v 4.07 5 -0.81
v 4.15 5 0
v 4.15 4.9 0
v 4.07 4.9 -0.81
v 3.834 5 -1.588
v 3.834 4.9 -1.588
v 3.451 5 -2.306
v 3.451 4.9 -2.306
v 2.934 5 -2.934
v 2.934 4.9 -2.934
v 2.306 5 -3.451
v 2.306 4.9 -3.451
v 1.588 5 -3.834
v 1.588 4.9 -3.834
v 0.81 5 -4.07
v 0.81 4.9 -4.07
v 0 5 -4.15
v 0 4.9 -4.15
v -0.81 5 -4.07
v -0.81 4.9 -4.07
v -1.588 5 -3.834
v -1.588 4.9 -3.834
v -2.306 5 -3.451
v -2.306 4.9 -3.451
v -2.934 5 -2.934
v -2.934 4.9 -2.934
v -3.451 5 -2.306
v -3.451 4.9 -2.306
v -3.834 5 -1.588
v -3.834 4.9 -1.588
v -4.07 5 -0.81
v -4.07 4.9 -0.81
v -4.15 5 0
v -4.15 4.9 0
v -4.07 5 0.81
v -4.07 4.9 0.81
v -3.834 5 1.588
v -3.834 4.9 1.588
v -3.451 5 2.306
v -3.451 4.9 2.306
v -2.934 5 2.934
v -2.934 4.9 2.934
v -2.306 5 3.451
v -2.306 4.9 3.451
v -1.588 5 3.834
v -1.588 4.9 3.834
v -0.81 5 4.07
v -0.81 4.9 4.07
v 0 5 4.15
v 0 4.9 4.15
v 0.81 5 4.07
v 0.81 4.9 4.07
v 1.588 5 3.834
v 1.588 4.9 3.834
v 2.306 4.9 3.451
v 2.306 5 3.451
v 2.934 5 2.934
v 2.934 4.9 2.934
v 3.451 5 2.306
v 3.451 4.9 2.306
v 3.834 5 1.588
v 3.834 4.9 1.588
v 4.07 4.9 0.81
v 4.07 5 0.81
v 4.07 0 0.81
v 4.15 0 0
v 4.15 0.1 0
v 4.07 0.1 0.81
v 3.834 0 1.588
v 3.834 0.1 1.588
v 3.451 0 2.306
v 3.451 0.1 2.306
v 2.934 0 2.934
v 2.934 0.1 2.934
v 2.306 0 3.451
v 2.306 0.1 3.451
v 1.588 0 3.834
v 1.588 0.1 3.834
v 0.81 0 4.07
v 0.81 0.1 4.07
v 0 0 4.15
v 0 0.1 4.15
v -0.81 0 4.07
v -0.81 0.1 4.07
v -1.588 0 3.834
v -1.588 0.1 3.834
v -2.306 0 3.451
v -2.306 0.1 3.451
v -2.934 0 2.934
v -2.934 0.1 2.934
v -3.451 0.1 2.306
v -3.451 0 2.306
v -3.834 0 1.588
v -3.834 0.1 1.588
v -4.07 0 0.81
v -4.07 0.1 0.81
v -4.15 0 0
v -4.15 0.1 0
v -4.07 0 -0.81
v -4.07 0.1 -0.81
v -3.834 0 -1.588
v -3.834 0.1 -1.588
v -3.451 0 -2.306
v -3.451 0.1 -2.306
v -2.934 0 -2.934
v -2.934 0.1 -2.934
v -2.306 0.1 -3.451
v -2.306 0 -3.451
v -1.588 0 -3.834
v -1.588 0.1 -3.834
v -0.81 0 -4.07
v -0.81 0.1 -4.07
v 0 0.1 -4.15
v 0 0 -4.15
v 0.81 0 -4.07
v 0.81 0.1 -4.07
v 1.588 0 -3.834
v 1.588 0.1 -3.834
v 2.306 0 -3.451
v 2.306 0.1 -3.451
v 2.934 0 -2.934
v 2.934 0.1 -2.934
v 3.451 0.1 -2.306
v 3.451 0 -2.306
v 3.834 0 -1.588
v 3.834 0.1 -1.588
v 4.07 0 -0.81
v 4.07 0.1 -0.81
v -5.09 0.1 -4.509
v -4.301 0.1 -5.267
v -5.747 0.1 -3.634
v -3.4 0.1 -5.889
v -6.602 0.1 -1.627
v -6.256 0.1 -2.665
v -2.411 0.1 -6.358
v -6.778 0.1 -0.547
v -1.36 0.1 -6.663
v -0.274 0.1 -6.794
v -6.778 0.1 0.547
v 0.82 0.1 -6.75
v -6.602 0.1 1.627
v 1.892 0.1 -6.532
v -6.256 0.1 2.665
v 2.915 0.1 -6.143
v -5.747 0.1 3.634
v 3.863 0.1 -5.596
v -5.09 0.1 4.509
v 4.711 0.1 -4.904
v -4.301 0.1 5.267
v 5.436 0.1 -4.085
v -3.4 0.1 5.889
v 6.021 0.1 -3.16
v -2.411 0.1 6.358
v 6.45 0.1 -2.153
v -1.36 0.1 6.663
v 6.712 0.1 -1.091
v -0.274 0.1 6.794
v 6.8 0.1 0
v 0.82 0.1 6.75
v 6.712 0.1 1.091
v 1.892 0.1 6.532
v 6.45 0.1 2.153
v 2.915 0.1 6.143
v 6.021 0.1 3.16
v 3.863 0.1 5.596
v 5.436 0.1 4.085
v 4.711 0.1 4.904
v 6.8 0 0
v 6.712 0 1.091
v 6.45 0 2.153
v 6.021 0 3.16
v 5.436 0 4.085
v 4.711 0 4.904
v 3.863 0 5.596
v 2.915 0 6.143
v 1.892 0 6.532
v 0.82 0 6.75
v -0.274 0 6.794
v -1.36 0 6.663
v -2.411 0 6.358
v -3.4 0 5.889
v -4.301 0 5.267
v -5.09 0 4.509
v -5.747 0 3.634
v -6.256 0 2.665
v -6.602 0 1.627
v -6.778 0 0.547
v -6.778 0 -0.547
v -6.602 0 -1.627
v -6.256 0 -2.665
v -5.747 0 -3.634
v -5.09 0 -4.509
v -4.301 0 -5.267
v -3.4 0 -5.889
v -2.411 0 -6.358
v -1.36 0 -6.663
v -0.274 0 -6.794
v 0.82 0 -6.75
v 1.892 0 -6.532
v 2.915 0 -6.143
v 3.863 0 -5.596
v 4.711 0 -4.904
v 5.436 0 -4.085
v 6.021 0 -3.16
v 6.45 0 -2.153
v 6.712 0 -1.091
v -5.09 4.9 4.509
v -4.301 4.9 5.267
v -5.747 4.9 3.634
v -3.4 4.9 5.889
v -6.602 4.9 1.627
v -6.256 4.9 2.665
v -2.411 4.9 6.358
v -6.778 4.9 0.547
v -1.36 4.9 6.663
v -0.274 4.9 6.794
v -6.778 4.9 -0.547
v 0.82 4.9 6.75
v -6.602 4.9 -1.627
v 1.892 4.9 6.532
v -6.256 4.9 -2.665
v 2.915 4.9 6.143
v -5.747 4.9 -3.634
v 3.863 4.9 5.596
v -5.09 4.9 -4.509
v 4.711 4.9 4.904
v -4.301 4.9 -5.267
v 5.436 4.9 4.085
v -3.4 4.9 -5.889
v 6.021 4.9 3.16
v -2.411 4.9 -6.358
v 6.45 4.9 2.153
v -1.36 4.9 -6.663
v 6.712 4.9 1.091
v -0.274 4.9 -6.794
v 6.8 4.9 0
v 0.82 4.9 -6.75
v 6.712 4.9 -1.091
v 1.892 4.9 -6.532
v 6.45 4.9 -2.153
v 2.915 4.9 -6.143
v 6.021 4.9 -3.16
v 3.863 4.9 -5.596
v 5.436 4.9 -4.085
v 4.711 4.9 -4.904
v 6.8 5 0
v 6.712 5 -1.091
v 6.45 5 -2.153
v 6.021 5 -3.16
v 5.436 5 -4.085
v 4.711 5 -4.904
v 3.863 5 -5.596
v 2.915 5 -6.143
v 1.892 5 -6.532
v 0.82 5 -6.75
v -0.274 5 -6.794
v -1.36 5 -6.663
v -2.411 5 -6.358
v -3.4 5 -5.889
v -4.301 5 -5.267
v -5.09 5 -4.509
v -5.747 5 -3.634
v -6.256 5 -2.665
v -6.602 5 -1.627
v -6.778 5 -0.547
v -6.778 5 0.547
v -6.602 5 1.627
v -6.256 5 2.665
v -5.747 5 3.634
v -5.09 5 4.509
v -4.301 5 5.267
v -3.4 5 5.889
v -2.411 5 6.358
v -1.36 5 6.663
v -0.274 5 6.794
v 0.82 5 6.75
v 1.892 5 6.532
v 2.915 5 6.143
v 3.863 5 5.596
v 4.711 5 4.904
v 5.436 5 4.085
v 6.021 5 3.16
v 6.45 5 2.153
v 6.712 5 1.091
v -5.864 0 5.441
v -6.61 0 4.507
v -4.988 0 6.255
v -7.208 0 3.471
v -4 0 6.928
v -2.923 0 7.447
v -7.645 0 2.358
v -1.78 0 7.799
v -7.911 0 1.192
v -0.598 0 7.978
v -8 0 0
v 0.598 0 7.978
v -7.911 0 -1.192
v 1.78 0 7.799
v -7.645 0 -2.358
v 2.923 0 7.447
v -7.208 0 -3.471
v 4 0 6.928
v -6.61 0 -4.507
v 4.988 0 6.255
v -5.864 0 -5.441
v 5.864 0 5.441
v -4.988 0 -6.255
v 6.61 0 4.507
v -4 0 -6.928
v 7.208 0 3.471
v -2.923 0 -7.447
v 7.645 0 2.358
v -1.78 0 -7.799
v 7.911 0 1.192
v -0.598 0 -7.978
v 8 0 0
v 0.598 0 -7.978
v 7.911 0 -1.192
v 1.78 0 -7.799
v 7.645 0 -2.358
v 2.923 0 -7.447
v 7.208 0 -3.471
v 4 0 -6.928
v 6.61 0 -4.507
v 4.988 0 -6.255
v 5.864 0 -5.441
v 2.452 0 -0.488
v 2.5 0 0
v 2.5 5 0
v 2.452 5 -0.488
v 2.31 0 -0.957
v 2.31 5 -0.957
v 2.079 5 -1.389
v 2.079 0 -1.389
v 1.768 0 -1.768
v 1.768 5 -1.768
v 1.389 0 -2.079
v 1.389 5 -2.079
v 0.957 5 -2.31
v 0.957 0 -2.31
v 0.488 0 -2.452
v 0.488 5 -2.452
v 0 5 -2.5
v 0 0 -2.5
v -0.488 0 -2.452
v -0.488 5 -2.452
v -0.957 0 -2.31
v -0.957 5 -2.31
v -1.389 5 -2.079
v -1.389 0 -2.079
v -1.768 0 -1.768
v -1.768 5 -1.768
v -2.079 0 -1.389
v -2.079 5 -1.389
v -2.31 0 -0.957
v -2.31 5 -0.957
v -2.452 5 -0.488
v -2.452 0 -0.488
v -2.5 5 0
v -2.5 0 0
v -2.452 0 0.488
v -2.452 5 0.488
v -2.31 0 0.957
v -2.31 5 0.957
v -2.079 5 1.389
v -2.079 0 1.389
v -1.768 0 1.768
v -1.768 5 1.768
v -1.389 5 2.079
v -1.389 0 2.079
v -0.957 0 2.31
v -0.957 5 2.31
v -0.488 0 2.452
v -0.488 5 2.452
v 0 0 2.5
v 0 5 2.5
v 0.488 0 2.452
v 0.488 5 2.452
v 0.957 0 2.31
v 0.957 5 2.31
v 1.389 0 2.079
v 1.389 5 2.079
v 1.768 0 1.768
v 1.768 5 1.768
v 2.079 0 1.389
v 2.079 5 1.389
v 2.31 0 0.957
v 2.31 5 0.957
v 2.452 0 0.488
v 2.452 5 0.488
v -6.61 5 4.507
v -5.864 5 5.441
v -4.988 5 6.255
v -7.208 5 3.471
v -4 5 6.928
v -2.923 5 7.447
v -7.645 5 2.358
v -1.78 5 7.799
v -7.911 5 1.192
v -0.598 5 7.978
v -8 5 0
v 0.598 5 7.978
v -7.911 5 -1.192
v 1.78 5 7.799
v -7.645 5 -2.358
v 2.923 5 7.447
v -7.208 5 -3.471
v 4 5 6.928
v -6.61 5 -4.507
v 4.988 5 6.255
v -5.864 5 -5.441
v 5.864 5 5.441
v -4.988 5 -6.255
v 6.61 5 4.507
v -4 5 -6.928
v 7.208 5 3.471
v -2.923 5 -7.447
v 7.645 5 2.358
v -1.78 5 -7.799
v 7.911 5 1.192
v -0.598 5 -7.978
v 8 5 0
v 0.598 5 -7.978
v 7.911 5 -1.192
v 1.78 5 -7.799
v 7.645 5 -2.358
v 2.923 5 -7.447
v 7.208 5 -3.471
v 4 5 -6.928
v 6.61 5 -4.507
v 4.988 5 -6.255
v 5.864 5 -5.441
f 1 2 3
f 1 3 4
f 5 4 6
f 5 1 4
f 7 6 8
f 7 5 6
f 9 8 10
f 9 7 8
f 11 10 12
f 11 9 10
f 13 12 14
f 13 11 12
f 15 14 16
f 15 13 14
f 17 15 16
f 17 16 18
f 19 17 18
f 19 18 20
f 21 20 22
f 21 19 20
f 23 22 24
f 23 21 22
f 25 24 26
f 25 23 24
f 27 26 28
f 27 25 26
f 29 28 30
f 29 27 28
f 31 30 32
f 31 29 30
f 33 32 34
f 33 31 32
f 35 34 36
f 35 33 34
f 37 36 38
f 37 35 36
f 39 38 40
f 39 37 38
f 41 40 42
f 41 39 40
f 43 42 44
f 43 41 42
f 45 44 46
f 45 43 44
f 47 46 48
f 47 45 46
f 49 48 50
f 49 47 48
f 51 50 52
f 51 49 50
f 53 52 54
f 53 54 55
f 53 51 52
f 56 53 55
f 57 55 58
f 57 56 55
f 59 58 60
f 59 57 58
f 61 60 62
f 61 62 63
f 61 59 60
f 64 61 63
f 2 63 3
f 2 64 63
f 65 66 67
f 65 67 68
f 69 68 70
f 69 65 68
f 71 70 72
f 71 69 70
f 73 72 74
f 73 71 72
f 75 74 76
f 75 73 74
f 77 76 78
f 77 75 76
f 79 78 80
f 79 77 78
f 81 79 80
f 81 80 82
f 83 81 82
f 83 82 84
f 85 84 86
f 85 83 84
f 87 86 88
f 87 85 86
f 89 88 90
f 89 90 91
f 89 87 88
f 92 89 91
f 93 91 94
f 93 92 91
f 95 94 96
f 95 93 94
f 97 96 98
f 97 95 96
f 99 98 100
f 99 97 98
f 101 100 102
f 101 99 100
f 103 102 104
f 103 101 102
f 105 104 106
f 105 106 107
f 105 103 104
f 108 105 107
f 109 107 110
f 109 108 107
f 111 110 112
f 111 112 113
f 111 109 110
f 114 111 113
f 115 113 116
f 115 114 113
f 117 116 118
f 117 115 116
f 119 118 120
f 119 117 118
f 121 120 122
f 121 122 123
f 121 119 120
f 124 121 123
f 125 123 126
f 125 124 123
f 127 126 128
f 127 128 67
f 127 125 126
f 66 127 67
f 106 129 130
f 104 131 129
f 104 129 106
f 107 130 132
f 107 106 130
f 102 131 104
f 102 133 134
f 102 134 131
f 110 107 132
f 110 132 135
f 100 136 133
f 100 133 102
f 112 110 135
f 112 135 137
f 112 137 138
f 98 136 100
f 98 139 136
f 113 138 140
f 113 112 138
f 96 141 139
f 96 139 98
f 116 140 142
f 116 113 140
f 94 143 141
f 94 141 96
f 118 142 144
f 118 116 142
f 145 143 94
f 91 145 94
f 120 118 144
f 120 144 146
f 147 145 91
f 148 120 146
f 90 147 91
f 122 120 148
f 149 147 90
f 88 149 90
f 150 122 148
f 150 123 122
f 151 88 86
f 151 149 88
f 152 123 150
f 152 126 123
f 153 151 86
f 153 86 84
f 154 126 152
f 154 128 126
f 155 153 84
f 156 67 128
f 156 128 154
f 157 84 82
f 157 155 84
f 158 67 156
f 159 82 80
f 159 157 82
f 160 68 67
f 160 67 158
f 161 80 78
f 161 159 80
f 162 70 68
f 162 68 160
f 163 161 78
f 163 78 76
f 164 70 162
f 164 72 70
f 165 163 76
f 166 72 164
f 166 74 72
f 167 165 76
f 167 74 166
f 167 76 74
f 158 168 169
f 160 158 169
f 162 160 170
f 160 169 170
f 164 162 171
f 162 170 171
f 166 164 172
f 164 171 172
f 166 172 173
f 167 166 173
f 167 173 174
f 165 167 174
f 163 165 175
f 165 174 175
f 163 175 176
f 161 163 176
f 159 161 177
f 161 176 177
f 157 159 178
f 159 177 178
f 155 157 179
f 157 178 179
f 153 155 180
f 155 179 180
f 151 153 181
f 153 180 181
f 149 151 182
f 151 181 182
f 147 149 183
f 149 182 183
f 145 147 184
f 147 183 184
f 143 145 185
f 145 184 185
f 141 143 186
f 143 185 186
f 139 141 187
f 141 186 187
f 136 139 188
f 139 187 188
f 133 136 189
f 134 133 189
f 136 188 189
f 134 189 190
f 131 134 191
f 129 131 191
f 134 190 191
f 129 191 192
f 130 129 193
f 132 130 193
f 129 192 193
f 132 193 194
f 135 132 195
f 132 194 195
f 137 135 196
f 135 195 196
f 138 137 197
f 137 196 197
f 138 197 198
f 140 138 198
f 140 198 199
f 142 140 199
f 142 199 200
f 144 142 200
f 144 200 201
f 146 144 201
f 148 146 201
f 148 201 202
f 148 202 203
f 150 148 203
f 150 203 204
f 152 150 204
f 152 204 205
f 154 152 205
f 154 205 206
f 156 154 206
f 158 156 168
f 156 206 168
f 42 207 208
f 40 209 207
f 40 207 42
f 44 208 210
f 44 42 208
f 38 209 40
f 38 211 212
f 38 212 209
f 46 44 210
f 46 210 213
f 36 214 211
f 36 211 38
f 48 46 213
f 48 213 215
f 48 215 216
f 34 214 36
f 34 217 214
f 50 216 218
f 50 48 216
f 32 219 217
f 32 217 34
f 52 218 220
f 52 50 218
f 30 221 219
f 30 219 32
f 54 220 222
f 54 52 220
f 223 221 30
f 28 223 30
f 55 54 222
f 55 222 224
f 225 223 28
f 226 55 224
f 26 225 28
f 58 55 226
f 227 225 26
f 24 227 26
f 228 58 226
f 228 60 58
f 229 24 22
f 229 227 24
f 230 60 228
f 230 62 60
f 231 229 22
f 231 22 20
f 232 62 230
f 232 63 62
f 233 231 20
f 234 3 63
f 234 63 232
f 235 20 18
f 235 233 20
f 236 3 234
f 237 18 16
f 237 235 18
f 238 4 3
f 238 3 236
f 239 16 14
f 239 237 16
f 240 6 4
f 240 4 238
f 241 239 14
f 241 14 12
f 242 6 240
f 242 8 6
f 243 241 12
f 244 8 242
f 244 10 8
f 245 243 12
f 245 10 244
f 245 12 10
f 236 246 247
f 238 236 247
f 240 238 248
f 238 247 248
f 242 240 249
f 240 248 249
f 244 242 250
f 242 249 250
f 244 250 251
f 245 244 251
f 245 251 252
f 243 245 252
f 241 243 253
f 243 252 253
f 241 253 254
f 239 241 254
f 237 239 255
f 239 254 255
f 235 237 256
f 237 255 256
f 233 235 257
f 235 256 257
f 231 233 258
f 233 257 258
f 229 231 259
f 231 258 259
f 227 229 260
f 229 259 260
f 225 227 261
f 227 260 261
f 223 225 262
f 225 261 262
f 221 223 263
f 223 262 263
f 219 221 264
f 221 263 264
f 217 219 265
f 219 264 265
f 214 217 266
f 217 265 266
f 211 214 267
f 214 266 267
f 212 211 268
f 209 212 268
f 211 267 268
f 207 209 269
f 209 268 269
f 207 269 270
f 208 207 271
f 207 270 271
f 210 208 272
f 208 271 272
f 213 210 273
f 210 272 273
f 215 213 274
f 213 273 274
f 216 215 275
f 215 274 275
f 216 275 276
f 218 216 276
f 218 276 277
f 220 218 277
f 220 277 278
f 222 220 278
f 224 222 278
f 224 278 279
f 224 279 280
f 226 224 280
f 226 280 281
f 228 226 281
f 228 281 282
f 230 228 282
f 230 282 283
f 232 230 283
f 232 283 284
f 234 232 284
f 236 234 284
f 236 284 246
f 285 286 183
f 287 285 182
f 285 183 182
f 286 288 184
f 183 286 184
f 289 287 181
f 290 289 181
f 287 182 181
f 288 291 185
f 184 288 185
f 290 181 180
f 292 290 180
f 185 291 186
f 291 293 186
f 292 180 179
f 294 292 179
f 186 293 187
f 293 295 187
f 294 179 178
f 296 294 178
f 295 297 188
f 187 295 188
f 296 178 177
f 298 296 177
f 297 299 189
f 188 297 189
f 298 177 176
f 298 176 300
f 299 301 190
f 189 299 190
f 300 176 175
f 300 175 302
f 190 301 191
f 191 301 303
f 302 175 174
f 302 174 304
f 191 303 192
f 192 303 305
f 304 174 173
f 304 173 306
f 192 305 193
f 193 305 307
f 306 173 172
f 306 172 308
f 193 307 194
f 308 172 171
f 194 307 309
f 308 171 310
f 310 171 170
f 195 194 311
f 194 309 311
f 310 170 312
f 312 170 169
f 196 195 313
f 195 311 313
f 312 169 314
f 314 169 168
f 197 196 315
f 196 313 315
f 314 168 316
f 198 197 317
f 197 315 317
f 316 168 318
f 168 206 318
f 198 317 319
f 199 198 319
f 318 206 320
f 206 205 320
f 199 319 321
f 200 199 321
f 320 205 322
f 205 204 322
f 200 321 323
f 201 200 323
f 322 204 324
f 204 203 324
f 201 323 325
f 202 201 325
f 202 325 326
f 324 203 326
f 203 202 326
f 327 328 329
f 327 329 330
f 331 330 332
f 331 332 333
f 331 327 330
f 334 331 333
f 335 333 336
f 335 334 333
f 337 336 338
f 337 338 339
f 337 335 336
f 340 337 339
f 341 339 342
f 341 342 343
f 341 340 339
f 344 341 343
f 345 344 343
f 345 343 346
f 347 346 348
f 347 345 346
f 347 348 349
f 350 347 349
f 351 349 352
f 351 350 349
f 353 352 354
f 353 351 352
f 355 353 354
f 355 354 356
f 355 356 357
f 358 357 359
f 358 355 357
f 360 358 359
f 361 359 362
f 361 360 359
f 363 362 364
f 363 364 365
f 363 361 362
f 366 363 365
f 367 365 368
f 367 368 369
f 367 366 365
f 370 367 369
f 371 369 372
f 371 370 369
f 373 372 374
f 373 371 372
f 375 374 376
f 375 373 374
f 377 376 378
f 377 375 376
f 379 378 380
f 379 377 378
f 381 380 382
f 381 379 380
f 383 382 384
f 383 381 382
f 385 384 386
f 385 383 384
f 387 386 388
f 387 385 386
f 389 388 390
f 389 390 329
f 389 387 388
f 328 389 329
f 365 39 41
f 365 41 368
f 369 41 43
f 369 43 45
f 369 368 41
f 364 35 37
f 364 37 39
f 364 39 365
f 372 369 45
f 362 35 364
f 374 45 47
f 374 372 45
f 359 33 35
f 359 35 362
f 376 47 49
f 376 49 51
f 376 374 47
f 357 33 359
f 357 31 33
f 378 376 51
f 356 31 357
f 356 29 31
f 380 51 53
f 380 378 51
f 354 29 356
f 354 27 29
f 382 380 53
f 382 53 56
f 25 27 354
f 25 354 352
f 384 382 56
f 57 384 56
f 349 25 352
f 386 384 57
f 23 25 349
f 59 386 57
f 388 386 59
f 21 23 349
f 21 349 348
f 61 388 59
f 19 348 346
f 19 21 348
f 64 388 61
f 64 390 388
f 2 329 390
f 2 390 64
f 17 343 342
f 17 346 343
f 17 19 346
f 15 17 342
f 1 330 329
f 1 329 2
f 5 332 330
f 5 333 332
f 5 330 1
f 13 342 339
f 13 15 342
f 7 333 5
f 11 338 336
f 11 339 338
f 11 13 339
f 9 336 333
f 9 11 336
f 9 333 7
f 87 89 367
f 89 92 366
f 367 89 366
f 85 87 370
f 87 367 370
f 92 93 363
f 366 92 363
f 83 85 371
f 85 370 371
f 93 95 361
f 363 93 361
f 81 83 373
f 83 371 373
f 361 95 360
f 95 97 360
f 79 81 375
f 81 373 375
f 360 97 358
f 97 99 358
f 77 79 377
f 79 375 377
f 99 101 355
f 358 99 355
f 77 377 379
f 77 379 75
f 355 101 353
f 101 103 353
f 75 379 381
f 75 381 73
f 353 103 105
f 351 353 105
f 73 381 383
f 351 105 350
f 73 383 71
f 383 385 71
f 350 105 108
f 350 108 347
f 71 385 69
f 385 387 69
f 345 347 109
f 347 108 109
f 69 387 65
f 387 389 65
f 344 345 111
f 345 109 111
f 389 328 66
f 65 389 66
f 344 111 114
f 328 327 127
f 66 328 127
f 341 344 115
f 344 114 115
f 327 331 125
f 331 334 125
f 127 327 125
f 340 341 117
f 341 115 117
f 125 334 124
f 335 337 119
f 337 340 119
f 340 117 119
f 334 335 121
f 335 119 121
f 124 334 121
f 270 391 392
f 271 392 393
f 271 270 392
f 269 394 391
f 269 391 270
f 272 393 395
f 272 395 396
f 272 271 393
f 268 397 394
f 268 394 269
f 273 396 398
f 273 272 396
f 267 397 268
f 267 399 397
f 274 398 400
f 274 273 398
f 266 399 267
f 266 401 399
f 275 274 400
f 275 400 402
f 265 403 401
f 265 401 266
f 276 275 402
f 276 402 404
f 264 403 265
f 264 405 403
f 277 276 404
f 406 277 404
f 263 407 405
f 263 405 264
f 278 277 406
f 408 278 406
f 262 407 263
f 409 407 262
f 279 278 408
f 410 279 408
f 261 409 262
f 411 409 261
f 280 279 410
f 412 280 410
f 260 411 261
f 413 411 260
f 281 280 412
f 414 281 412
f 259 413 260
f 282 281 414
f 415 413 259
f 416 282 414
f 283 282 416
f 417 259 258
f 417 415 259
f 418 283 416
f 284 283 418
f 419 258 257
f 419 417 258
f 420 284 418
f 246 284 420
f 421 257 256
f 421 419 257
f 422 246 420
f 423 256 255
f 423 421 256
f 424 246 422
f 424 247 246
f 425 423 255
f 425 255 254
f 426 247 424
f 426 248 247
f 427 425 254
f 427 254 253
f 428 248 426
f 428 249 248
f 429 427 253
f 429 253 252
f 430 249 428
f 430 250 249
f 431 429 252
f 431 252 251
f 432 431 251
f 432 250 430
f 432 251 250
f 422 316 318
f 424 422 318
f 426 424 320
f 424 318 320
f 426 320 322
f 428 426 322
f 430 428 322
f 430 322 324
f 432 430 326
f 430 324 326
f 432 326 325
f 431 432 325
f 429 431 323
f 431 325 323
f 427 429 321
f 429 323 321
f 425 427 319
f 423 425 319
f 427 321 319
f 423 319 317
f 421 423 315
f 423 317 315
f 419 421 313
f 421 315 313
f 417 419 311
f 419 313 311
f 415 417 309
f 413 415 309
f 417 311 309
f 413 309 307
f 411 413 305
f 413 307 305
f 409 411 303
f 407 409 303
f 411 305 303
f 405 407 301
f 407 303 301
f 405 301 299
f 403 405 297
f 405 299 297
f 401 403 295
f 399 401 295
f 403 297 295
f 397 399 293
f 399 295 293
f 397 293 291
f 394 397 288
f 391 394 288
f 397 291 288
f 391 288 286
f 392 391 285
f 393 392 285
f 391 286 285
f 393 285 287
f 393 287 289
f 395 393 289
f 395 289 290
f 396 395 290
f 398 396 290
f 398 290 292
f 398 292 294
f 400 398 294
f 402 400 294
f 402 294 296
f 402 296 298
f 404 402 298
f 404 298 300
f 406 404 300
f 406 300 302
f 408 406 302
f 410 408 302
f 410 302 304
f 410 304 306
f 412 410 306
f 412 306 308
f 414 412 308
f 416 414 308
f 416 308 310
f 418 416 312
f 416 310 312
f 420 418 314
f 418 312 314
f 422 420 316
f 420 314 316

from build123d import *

# Parameters (mm, degrees)
SKETCH1_R           = 8
SKETCH1_R_2         = 2.5
BOSS_EXTRUDE1_DEPTH = 5
SKETCH2_R           = 6.8
SKETCH2_R_2         = 4.15
CUT_EXTRUDE1_DEPTH  = 0.1
SKETCH3_R           = 6.8
SKETCH3_R_2         = 4.15
CUT_EXTRUDE2_DEPTH  = 0.1


with BuildPart() as part:
    # Sketch1 → Boss-Extrude1 (new body)
    with BuildSketch(Plane(origin=(0, 0, 0), x_dir=(1, 0, 0), z_dir=(0, 1, 0))):
        Circle(SKETCH1_R)
        Circle(SKETCH1_R_2, mode=Mode.SUBTRACT)
    extrude(amount=BOSS_EXTRUDE1_DEPTH)

    # Sketch2 → Cut-Extrude1 (cut)
    with BuildSketch(Plane(origin=(0, 5, 0), x_dir=(1, 0, 0), z_dir=(0, 1, 0))):
        Circle(SKETCH2_R)
        Circle(SKETCH2_R_2, mode=Mode.SUBTRACT)
    extrude(amount=-CUT_EXTRUDE1_DEPTH, mode=Mode.SUBTRACT)

    # Sketch3 → Cut-Extrude2 (cut)
    with BuildSketch(Plane.XZ):
        Circle(SKETCH3_R)
        Circle(SKETCH3_R_2, mode=Mode.SUBTRACT)
    extrude(amount=-CUT_EXTRUDE2_DEPTH, mode=Mode.SUBTRACT)


solid = part.part
